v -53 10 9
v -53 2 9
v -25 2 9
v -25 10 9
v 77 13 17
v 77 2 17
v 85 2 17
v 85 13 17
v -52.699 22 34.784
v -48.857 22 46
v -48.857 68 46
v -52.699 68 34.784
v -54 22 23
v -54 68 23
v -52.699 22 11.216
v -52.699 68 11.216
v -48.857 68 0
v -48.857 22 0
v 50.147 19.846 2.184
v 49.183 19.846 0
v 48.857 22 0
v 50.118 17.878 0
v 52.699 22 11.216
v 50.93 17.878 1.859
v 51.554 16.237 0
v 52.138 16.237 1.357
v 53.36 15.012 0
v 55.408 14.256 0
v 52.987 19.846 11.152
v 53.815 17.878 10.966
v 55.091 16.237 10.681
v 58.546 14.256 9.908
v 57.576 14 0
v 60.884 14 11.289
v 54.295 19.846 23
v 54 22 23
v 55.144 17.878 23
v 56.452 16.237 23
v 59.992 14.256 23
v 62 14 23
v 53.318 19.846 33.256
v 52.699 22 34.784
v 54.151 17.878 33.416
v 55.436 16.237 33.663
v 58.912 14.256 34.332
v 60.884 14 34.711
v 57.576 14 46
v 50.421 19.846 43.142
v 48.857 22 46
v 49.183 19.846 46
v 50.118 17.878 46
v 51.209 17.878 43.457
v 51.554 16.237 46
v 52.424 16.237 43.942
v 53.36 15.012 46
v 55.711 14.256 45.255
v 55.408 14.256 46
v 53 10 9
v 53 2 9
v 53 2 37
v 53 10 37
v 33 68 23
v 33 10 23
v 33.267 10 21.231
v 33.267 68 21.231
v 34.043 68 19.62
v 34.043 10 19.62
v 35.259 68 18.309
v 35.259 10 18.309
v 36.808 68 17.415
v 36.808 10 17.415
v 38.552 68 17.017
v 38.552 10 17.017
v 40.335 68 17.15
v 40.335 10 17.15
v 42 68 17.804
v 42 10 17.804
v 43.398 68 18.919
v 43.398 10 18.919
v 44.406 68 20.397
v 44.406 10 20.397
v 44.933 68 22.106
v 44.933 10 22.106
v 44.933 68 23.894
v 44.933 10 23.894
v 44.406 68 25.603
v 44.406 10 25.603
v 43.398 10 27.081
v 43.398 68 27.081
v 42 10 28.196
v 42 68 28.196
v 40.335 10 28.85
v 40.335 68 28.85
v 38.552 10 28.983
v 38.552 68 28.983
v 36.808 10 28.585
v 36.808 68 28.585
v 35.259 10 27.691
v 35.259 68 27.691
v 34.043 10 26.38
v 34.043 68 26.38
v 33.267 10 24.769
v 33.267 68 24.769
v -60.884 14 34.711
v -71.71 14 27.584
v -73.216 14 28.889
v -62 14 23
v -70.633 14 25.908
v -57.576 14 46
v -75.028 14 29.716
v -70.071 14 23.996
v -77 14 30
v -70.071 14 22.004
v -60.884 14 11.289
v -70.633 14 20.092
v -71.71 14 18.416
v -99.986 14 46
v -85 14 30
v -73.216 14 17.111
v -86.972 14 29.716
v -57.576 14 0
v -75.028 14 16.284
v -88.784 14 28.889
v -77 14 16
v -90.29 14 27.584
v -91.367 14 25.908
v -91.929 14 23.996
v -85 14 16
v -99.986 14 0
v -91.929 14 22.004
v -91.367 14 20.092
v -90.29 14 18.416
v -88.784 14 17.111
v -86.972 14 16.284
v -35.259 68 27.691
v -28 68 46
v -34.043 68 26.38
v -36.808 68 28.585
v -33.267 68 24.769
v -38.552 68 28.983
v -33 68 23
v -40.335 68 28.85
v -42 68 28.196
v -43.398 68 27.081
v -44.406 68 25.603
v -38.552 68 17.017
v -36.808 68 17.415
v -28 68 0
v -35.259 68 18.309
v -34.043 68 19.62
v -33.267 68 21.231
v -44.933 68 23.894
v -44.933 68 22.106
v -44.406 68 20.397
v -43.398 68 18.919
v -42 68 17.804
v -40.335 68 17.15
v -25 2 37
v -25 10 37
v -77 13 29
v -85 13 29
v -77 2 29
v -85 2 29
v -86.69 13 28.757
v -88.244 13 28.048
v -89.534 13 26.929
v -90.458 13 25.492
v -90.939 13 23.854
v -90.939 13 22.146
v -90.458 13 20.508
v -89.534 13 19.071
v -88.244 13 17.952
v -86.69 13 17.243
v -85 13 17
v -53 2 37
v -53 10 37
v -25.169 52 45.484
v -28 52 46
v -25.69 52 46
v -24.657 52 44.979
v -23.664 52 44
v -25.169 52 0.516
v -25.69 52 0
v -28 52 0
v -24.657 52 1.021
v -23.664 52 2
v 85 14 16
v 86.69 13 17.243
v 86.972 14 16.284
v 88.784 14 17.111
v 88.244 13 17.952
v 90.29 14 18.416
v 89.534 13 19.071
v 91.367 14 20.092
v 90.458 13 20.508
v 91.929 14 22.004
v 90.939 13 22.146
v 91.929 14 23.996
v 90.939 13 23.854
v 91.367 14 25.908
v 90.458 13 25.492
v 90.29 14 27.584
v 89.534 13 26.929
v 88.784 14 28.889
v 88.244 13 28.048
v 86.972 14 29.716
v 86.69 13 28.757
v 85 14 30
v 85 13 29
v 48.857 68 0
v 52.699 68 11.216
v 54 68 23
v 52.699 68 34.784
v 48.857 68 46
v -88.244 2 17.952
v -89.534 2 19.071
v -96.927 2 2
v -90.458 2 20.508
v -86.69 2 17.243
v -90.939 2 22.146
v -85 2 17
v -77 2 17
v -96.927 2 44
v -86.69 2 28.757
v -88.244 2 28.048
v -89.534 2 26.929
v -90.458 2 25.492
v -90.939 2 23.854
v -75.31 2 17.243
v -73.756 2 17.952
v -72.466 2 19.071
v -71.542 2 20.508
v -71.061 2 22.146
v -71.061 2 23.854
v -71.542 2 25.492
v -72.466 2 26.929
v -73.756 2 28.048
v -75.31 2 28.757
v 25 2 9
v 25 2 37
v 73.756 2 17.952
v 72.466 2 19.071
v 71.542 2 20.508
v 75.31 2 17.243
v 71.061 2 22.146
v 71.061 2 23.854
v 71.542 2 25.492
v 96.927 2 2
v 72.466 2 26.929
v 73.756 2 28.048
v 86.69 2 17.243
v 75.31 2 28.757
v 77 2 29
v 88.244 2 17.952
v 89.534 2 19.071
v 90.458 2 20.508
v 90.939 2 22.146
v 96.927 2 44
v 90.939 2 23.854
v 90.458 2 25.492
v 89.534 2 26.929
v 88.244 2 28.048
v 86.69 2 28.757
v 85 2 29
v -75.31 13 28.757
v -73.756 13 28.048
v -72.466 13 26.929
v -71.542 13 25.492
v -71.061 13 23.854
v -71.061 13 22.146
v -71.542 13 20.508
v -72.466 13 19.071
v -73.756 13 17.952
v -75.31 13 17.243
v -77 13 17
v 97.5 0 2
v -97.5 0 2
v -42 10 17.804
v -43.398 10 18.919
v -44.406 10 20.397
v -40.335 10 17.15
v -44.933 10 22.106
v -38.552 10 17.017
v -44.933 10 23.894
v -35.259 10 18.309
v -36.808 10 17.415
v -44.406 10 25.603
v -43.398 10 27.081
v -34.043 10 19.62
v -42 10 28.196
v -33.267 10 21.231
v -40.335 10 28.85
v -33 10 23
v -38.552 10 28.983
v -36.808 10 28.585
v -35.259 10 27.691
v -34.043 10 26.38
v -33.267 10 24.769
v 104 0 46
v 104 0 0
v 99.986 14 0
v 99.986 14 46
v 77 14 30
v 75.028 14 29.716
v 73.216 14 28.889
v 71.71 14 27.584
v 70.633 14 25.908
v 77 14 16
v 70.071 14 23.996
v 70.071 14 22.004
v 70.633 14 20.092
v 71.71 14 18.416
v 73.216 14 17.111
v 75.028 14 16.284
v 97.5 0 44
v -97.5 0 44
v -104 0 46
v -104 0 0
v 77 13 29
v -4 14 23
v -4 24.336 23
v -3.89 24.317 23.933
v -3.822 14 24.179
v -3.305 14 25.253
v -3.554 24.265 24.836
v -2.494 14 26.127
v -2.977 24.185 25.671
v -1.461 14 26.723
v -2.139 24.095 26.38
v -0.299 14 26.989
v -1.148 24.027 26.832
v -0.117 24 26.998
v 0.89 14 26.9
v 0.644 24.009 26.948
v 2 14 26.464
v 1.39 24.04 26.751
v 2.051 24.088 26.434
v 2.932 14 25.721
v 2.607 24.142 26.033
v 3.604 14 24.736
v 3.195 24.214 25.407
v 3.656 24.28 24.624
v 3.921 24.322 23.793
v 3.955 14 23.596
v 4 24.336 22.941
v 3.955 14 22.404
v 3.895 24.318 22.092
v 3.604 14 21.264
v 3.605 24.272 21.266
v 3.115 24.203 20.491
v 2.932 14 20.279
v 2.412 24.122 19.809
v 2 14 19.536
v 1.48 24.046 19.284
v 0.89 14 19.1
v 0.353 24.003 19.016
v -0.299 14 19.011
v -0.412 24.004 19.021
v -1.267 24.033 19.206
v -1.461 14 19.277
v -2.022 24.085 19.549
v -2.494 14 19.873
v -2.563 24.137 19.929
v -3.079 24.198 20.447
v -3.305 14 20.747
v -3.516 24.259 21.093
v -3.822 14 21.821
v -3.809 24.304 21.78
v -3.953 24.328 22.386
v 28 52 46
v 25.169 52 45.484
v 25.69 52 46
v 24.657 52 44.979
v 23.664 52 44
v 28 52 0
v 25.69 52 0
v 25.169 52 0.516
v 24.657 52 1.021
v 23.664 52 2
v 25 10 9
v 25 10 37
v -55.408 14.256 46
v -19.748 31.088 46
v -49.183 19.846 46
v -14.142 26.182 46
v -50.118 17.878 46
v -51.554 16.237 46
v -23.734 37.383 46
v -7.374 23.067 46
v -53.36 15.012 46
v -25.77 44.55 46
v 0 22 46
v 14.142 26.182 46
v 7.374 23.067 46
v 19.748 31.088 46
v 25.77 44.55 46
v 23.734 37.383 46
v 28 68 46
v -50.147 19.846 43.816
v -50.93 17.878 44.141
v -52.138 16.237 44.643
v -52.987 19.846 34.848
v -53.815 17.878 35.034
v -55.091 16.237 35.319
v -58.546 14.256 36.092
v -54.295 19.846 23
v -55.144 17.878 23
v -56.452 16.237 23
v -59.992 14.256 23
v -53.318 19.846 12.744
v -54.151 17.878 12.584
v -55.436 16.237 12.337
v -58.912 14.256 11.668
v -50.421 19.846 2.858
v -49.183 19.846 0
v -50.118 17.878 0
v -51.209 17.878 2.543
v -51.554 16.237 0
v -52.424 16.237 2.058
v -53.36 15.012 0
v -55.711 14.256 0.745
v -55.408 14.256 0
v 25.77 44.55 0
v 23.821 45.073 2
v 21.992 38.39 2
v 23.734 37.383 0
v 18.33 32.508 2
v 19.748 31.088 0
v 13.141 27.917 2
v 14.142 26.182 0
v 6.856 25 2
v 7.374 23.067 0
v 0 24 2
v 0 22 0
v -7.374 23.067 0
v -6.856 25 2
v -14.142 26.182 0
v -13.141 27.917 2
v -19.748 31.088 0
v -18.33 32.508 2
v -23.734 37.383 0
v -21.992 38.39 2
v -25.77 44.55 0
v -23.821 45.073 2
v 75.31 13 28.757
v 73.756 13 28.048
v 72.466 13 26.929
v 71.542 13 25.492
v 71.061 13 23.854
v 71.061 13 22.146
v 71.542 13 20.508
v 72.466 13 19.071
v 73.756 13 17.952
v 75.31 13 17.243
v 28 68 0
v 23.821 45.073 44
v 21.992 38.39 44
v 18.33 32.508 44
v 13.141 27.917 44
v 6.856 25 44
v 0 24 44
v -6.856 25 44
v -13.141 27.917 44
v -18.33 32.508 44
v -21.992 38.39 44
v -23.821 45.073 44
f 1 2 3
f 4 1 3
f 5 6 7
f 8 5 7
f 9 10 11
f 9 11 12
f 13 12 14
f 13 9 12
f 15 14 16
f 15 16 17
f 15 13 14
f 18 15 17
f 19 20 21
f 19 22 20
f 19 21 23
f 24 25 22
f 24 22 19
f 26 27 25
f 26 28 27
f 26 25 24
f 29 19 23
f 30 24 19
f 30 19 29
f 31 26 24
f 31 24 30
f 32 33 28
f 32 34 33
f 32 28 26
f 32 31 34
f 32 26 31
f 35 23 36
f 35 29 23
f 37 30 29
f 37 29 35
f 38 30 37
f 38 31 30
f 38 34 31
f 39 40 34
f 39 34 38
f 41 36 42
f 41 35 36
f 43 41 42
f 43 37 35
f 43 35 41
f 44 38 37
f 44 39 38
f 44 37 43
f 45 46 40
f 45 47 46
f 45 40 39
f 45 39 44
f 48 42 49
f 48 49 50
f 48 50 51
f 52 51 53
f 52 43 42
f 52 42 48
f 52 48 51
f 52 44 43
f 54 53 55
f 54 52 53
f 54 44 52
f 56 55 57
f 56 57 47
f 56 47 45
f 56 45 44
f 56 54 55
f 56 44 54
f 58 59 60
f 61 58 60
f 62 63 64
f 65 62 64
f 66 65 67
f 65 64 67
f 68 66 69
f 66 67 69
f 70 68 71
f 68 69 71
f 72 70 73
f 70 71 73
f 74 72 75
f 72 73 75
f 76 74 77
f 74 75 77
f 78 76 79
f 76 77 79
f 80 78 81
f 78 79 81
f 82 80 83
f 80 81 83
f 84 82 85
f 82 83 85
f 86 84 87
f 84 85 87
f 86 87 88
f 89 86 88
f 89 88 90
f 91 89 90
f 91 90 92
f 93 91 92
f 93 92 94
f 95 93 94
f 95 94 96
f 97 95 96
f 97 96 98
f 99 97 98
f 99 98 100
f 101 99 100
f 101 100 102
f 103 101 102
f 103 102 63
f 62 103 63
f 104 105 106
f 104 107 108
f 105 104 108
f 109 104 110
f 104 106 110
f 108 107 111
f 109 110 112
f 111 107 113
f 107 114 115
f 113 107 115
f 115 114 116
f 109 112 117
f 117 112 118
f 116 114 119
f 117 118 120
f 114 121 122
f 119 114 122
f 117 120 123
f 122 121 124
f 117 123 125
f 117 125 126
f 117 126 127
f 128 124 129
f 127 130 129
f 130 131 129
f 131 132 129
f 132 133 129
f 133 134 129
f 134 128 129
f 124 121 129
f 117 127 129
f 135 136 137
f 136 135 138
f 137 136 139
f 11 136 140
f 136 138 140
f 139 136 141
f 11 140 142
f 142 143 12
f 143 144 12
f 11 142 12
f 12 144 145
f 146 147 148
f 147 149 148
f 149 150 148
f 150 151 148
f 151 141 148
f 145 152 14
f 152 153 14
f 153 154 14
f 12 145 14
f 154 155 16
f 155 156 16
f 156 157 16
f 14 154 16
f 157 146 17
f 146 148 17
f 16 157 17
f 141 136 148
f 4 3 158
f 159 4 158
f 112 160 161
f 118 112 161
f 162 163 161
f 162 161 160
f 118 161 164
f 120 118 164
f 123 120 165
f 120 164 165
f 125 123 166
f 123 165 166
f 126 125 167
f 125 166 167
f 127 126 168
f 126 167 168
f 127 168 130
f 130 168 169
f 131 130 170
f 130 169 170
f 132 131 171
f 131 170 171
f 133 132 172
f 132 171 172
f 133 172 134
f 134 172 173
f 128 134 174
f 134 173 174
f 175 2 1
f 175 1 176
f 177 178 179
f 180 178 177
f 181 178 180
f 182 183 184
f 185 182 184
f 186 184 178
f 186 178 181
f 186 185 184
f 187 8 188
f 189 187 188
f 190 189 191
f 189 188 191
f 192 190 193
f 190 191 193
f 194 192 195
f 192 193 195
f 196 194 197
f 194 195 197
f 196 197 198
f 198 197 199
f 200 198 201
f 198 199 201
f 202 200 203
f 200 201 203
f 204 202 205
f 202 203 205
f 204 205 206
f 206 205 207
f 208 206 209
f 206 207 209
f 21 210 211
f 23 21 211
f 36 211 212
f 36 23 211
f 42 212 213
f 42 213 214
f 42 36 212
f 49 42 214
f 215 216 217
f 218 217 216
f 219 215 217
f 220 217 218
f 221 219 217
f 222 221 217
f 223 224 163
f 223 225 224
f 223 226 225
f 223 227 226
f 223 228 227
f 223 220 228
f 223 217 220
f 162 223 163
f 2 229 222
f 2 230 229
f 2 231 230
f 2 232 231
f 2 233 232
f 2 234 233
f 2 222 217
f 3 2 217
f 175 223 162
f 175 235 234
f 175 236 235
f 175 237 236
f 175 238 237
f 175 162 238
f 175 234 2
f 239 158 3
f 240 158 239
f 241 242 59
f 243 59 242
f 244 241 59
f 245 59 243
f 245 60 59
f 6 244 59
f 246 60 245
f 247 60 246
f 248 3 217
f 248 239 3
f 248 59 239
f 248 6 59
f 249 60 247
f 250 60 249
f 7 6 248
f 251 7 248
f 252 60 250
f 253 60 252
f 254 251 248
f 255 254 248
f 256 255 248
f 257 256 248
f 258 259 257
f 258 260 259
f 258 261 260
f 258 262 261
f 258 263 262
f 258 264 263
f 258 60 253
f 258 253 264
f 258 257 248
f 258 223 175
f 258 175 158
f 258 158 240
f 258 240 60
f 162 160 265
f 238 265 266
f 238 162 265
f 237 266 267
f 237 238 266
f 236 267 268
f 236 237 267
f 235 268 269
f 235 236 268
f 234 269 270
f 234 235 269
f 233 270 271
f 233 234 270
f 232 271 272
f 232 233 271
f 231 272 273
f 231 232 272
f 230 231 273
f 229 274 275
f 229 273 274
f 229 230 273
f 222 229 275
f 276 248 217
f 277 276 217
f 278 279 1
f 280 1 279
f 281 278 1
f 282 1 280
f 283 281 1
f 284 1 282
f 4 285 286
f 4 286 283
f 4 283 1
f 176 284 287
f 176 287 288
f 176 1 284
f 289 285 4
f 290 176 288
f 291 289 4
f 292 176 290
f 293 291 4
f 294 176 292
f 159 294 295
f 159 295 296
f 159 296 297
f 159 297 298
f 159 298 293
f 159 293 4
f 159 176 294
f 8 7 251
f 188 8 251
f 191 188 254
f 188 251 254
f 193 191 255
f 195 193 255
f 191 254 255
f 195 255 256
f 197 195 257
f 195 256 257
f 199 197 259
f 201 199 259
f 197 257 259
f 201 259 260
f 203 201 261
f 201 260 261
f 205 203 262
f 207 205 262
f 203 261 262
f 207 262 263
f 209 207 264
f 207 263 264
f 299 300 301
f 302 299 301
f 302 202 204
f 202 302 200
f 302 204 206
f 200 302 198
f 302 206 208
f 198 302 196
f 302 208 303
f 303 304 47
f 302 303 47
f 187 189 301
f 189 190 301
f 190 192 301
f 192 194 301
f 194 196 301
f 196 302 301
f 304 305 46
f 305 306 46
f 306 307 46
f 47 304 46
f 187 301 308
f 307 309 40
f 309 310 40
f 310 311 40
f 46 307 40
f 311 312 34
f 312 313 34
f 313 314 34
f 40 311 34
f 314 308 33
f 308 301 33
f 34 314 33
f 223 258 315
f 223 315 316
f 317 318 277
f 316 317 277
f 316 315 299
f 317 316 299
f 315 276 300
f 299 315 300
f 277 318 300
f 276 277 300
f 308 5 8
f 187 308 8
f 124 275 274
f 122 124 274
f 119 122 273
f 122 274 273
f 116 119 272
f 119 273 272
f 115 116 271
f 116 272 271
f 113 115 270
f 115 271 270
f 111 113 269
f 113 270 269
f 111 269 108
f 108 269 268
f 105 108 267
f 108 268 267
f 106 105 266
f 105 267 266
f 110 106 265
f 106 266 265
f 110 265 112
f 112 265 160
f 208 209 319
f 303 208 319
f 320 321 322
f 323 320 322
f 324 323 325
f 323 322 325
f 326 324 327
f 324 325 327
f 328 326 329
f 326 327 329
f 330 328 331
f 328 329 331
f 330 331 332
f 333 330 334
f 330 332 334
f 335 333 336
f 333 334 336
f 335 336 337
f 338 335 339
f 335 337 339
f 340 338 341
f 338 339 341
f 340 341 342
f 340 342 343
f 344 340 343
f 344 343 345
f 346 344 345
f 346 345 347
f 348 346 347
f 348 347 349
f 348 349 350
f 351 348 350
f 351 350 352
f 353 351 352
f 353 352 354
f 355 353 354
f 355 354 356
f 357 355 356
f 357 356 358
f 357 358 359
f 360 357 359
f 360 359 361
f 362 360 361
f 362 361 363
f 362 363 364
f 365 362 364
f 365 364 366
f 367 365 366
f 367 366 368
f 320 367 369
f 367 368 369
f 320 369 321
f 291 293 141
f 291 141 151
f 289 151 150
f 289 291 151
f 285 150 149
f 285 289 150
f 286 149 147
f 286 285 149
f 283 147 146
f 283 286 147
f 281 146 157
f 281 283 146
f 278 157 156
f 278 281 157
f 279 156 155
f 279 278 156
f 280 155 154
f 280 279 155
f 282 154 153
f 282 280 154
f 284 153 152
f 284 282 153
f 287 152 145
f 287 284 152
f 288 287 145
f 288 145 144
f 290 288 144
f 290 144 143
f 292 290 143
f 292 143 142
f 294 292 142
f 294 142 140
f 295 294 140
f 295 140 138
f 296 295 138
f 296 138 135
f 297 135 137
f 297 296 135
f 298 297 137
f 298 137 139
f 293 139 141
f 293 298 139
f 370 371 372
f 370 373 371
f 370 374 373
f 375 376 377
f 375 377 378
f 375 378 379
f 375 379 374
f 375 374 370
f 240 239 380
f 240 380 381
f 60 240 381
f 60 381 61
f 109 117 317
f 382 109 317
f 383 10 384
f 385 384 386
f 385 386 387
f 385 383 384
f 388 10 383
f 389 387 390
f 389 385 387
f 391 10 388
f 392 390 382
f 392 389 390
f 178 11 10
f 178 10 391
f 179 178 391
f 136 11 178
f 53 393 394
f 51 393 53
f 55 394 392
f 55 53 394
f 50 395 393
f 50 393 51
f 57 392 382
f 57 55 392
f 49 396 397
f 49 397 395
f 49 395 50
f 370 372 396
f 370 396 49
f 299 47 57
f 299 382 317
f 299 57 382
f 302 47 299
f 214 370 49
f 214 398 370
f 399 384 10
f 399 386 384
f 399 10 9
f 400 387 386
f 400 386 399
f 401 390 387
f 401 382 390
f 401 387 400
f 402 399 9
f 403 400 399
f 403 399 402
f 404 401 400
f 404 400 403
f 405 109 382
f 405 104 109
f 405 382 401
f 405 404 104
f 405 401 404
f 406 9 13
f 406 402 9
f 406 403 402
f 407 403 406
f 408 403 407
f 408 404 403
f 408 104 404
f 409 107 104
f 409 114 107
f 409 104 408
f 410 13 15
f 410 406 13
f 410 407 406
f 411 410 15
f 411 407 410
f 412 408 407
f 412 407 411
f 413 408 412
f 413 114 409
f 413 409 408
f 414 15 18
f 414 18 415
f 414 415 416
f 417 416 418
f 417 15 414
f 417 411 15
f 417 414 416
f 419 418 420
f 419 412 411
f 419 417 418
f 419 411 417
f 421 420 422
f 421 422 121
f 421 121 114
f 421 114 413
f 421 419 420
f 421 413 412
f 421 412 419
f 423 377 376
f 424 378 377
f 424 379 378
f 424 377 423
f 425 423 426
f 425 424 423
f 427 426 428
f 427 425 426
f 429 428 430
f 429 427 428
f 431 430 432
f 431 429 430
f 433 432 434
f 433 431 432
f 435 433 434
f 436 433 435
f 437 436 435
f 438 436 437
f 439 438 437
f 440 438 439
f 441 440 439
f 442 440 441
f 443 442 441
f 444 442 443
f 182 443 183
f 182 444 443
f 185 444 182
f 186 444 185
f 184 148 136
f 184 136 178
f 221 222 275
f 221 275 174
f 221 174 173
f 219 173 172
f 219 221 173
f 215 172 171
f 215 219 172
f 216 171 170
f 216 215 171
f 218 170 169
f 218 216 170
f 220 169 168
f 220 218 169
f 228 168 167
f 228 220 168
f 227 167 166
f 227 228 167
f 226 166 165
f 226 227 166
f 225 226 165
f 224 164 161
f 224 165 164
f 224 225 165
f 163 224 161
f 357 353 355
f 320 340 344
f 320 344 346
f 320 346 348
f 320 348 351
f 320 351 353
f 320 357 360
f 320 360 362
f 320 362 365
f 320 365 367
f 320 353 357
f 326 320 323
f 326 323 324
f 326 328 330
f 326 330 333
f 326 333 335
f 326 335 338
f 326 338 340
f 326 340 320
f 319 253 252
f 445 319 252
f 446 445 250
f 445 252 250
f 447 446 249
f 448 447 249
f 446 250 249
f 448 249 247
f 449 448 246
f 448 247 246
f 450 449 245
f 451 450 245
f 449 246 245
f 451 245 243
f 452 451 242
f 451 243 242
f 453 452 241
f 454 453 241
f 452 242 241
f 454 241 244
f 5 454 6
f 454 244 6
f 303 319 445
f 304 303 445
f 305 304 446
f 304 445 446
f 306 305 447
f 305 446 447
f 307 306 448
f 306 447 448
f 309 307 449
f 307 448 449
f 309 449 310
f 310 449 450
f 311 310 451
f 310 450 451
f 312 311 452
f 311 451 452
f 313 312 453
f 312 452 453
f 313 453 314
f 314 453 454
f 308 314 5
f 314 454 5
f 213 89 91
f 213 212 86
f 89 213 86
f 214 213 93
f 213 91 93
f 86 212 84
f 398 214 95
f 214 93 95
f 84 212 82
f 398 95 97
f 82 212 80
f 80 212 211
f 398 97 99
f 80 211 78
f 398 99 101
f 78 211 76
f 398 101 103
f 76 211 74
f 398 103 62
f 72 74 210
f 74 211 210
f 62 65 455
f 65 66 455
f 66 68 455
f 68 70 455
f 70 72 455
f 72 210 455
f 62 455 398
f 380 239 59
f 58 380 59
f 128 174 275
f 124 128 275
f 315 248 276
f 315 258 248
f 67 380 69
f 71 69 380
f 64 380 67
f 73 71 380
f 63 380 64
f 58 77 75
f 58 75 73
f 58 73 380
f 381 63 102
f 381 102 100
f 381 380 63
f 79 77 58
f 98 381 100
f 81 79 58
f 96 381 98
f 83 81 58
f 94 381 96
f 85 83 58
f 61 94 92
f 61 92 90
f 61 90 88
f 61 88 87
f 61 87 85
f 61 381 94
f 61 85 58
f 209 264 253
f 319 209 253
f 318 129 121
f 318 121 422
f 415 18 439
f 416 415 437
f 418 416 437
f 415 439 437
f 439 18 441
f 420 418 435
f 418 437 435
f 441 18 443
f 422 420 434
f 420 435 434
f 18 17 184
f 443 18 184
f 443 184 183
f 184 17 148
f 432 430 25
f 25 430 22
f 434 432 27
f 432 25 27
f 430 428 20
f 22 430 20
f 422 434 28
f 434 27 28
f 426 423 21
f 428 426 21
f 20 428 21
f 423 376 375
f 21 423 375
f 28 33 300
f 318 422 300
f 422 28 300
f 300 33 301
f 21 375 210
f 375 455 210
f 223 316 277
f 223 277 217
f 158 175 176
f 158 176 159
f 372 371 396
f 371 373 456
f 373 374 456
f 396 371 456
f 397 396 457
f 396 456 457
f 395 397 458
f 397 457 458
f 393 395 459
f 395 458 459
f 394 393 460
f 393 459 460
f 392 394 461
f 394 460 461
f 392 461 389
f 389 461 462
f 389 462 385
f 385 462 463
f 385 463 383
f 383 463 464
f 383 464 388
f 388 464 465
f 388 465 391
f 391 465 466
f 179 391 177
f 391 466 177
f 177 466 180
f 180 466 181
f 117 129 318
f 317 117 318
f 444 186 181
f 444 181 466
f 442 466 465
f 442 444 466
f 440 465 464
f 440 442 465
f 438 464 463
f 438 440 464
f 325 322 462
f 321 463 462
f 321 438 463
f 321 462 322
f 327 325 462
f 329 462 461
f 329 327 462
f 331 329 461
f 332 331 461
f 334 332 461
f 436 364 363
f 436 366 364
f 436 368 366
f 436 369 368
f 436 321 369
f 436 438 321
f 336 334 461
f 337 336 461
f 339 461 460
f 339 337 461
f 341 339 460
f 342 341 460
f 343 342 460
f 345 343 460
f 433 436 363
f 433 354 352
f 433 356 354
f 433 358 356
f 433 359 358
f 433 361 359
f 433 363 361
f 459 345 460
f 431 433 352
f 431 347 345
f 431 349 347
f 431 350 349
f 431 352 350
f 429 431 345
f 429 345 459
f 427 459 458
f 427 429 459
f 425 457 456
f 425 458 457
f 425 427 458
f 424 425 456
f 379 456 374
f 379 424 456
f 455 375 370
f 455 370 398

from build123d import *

# Parameters (mm, degrees)
BOSS_EXTRUDE1_DEPTH     = 46
BOSS_EXTRUDE2_DEPTH     = 54
CUT_EXTRUDE1_DEPTH      = 133.4990566
CUT_EXTRUDE1_DEPTH_BACK = 133.4990566
CUT_EXTRUDE2_DEPTH      = 126.888839855
CUT_EXTRUDE2_DEPTH_BACK = 126.888839855
F_12_0MM_DOWEL_HOLE1_D  = 12
SKETCH14_W              = 28
SKETCH14_H              = 28
SKETCH14_R              = 6
CUT_EXTRUDE5_DEPTH      = 10
SKETCH15_R              = 4
CUT_EXTRUDE6_DEPTH      = 54
CUT_EXTRUDE7_DEPTH      = 21
CHAMFER2_SIZE           = 2
FILLET1_R               = 8
CHAMFER3_SIZE           = 1


with BuildPart() as part:
    # Sketch1 → Boss-Extrude1 (new body)
    with BuildSketch(Plane.XY):
        Polygon((-104, 0), (104, 0), (99.985564599, 14), (-99.985564599, 14), align=None)
    extrude(amount=BOSS_EXTRUDE1_DEPTH)

    # Sketch2 → Boss-Extrude2 (add)
    with BuildSketch(Plane(origin=(0, 14, 0), x_dir=(1, 0, 0), z_dir=(0, 1, 0))):
        with BuildLine():
            Line((-48.856934001, 0), (48.856934001, 0))
            ThreePointArc((48.856934001, 0), (54, -23), (48.856934001, -46))
            Line((48.856934001, -46), (-48.856934001, -46))
            ThreePointArc((-48.856934001, -46), (-54, -23), (-48.856934001, 0))
        make_face()
    extrude(amount=BOSS_EXTRUDE2_DEPTH)

    # Sketch3 → Cut-Extrude1 (cut, two sides: drawn at the far end of the back side and taken through both)
    with BuildSketch(Plane.XY.offset(46).offset(-CUT_EXTRUDE1_DEPTH_BACK)):
        with BuildLine():
            Line((28, 52), (28, 68))
            Line((28, 68), (-28, 68))
            Line((-28, 68), (-28, 52))
            Line((-28, 52), (-23.664319132, 52))
            ThreePointArc((-23.664319132, 52), (0, 24), (23.664319132, 52))
            Line((23.664319132, 52), (28, 52))
        make_face()
    extrude(amount=CUT_EXTRUDE1_DEPTH + CUT_EXTRUDE1_DEPTH_BACK, mode=Mode.SUBTRACT)

    # Sketch4 → Cut-Extrude2 (cut, two sides: drawn at the far end of the back side and taken through both)
    with BuildSketch(Plane(origin=(0, 14, 0), x_dir=(1, 0, 0), z_dir=(0, 1, 0)).offset(-CUT_EXTRUDE2_DEPTH_BACK)):
        with BuildLine():
            Line((77, -17), (85, -17))
            ThreePointArc((85, -17), (91, -23), (85, -29))
            Line((85, -29), (77, -29))
            ThreePointArc((77, -29), (71, -23), (77, -17))
        make_face()
        with BuildLine():
            Line((-77, -17), (-85, -17))
            ThreePointArc((-85, -17), (-91, -23), (-85, -29))
            Line((-85, -29), (-77, -29))
            ThreePointArc((-77, -29), (-71, -23), (-77, -17))
        make_face()
    extrude(amount=CUT_EXTRUDE2_DEPTH + CUT_EXTRUDE2_DEPTH_BACK, mode=Mode.SUBTRACT)

    # Ø12.0mm Dowel Hole1 (through all)
    with Locations(Plane(origin=(0, 68, 0), x_dir=(1, 0, 0), z_dir=(0, 1, 0))):
        with Locations((39, -23)):
            f_12_0mm_dowel_hole1 = Hole(F_12_0MM_DOWEL_HOLE1_D / 2)

    # Mirror1: Ø12.0mm Dowel Hole1 across plane
    add(f_12_0mm_dowel_hole1.mirror(Plane(origin=(0, 0, 0), x_dir=(0, 0, 1), z_dir=(1, 0, 0))), mode=Mode.SUBTRACT)

    # Sketch14 → Cut-Extrude5 (cut)
    # profile 1 of 2: a face of its own
    with BuildSketch(Plane.XZ):
        with Locations((-39, 23)):
            Rectangle(SKETCH14_W, SKETCH14_H)
        with Locations(Location((-39, 23, 0), (0, 0, 90))):
            Circle(SKETCH14_R, mode=Mode.SUBTRACT)
    # profile 2 of 2: a face of its own
    with BuildSketch(Plane.XZ):
        with Locations((39, 23)):
            Rectangle(SKETCH14_W, SKETCH14_H)
        with Locations(Location((39, 23, 0), (0, 0, 90))):
            Circle(SKETCH14_R, mode=Mode.SUBTRACT)
    extrude(amount=-CUT_EXTRUDE5_DEPTH, mode=Mode.SUBTRACT)

    # Sketch15 → Cut-Extrude6 (cut)
    with BuildSketch(Plane(origin=(0, 68, 0), x_dir=(1, 0, 0), z_dir=(0, 1, 0))):
        with Locations(Location((0, -23, 0), (0, 0, 180))):
            Circle(SKETCH15_R)
    extrude(amount=-CUT_EXTRUDE6_DEPTH, mode=Mode.SUBTRACT)

    # Sketch18 → Cut-Extrude7 (cut, symmetric)
    with BuildSketch(Plane.XY.offset(23)):
        Polygon((-97.5, 0), (-96.926509228, 2), (96.926509228, 2), (97.5, 0), align=None)
    extrude(amount=CUT_EXTRUDE7_DEPTH, both=True, mode=Mode.SUBTRACT)

    # Chamfer2
    chamfer2_edges = [part.edges().sort_by_distance(p)[0] for p in [
        (0, 24, 0),
        (0, 24, 46),
    ]]
    chamfer(chamfer2_edges, length=CHAMFER2_SIZE)

    # Fillet1
    fillet1_edges = [part.edges().sort_by_distance(p)[0] for p in [
        (54, 14, 23),
        (-54, 14, 23),
    ]]
    fillet(fillet1_edges, radius=FILLET1_R)

    # Chamfer3
    chamfer3_edges = [part.edges().sort_by_distance(p)[0] for p in [
        (-71, 14, 23),
        (-81, 14, 29),
        (-91, 14, 23),
        (-81, 14, 17),
        (81, 14, 17),
        (81, 14, 29),
        (91, 14, 23),
        (71, 14, 23),
    ]]
    chamfer(chamfer3_edges, length=CHAMFER3_SIZE)


solid = part.part
